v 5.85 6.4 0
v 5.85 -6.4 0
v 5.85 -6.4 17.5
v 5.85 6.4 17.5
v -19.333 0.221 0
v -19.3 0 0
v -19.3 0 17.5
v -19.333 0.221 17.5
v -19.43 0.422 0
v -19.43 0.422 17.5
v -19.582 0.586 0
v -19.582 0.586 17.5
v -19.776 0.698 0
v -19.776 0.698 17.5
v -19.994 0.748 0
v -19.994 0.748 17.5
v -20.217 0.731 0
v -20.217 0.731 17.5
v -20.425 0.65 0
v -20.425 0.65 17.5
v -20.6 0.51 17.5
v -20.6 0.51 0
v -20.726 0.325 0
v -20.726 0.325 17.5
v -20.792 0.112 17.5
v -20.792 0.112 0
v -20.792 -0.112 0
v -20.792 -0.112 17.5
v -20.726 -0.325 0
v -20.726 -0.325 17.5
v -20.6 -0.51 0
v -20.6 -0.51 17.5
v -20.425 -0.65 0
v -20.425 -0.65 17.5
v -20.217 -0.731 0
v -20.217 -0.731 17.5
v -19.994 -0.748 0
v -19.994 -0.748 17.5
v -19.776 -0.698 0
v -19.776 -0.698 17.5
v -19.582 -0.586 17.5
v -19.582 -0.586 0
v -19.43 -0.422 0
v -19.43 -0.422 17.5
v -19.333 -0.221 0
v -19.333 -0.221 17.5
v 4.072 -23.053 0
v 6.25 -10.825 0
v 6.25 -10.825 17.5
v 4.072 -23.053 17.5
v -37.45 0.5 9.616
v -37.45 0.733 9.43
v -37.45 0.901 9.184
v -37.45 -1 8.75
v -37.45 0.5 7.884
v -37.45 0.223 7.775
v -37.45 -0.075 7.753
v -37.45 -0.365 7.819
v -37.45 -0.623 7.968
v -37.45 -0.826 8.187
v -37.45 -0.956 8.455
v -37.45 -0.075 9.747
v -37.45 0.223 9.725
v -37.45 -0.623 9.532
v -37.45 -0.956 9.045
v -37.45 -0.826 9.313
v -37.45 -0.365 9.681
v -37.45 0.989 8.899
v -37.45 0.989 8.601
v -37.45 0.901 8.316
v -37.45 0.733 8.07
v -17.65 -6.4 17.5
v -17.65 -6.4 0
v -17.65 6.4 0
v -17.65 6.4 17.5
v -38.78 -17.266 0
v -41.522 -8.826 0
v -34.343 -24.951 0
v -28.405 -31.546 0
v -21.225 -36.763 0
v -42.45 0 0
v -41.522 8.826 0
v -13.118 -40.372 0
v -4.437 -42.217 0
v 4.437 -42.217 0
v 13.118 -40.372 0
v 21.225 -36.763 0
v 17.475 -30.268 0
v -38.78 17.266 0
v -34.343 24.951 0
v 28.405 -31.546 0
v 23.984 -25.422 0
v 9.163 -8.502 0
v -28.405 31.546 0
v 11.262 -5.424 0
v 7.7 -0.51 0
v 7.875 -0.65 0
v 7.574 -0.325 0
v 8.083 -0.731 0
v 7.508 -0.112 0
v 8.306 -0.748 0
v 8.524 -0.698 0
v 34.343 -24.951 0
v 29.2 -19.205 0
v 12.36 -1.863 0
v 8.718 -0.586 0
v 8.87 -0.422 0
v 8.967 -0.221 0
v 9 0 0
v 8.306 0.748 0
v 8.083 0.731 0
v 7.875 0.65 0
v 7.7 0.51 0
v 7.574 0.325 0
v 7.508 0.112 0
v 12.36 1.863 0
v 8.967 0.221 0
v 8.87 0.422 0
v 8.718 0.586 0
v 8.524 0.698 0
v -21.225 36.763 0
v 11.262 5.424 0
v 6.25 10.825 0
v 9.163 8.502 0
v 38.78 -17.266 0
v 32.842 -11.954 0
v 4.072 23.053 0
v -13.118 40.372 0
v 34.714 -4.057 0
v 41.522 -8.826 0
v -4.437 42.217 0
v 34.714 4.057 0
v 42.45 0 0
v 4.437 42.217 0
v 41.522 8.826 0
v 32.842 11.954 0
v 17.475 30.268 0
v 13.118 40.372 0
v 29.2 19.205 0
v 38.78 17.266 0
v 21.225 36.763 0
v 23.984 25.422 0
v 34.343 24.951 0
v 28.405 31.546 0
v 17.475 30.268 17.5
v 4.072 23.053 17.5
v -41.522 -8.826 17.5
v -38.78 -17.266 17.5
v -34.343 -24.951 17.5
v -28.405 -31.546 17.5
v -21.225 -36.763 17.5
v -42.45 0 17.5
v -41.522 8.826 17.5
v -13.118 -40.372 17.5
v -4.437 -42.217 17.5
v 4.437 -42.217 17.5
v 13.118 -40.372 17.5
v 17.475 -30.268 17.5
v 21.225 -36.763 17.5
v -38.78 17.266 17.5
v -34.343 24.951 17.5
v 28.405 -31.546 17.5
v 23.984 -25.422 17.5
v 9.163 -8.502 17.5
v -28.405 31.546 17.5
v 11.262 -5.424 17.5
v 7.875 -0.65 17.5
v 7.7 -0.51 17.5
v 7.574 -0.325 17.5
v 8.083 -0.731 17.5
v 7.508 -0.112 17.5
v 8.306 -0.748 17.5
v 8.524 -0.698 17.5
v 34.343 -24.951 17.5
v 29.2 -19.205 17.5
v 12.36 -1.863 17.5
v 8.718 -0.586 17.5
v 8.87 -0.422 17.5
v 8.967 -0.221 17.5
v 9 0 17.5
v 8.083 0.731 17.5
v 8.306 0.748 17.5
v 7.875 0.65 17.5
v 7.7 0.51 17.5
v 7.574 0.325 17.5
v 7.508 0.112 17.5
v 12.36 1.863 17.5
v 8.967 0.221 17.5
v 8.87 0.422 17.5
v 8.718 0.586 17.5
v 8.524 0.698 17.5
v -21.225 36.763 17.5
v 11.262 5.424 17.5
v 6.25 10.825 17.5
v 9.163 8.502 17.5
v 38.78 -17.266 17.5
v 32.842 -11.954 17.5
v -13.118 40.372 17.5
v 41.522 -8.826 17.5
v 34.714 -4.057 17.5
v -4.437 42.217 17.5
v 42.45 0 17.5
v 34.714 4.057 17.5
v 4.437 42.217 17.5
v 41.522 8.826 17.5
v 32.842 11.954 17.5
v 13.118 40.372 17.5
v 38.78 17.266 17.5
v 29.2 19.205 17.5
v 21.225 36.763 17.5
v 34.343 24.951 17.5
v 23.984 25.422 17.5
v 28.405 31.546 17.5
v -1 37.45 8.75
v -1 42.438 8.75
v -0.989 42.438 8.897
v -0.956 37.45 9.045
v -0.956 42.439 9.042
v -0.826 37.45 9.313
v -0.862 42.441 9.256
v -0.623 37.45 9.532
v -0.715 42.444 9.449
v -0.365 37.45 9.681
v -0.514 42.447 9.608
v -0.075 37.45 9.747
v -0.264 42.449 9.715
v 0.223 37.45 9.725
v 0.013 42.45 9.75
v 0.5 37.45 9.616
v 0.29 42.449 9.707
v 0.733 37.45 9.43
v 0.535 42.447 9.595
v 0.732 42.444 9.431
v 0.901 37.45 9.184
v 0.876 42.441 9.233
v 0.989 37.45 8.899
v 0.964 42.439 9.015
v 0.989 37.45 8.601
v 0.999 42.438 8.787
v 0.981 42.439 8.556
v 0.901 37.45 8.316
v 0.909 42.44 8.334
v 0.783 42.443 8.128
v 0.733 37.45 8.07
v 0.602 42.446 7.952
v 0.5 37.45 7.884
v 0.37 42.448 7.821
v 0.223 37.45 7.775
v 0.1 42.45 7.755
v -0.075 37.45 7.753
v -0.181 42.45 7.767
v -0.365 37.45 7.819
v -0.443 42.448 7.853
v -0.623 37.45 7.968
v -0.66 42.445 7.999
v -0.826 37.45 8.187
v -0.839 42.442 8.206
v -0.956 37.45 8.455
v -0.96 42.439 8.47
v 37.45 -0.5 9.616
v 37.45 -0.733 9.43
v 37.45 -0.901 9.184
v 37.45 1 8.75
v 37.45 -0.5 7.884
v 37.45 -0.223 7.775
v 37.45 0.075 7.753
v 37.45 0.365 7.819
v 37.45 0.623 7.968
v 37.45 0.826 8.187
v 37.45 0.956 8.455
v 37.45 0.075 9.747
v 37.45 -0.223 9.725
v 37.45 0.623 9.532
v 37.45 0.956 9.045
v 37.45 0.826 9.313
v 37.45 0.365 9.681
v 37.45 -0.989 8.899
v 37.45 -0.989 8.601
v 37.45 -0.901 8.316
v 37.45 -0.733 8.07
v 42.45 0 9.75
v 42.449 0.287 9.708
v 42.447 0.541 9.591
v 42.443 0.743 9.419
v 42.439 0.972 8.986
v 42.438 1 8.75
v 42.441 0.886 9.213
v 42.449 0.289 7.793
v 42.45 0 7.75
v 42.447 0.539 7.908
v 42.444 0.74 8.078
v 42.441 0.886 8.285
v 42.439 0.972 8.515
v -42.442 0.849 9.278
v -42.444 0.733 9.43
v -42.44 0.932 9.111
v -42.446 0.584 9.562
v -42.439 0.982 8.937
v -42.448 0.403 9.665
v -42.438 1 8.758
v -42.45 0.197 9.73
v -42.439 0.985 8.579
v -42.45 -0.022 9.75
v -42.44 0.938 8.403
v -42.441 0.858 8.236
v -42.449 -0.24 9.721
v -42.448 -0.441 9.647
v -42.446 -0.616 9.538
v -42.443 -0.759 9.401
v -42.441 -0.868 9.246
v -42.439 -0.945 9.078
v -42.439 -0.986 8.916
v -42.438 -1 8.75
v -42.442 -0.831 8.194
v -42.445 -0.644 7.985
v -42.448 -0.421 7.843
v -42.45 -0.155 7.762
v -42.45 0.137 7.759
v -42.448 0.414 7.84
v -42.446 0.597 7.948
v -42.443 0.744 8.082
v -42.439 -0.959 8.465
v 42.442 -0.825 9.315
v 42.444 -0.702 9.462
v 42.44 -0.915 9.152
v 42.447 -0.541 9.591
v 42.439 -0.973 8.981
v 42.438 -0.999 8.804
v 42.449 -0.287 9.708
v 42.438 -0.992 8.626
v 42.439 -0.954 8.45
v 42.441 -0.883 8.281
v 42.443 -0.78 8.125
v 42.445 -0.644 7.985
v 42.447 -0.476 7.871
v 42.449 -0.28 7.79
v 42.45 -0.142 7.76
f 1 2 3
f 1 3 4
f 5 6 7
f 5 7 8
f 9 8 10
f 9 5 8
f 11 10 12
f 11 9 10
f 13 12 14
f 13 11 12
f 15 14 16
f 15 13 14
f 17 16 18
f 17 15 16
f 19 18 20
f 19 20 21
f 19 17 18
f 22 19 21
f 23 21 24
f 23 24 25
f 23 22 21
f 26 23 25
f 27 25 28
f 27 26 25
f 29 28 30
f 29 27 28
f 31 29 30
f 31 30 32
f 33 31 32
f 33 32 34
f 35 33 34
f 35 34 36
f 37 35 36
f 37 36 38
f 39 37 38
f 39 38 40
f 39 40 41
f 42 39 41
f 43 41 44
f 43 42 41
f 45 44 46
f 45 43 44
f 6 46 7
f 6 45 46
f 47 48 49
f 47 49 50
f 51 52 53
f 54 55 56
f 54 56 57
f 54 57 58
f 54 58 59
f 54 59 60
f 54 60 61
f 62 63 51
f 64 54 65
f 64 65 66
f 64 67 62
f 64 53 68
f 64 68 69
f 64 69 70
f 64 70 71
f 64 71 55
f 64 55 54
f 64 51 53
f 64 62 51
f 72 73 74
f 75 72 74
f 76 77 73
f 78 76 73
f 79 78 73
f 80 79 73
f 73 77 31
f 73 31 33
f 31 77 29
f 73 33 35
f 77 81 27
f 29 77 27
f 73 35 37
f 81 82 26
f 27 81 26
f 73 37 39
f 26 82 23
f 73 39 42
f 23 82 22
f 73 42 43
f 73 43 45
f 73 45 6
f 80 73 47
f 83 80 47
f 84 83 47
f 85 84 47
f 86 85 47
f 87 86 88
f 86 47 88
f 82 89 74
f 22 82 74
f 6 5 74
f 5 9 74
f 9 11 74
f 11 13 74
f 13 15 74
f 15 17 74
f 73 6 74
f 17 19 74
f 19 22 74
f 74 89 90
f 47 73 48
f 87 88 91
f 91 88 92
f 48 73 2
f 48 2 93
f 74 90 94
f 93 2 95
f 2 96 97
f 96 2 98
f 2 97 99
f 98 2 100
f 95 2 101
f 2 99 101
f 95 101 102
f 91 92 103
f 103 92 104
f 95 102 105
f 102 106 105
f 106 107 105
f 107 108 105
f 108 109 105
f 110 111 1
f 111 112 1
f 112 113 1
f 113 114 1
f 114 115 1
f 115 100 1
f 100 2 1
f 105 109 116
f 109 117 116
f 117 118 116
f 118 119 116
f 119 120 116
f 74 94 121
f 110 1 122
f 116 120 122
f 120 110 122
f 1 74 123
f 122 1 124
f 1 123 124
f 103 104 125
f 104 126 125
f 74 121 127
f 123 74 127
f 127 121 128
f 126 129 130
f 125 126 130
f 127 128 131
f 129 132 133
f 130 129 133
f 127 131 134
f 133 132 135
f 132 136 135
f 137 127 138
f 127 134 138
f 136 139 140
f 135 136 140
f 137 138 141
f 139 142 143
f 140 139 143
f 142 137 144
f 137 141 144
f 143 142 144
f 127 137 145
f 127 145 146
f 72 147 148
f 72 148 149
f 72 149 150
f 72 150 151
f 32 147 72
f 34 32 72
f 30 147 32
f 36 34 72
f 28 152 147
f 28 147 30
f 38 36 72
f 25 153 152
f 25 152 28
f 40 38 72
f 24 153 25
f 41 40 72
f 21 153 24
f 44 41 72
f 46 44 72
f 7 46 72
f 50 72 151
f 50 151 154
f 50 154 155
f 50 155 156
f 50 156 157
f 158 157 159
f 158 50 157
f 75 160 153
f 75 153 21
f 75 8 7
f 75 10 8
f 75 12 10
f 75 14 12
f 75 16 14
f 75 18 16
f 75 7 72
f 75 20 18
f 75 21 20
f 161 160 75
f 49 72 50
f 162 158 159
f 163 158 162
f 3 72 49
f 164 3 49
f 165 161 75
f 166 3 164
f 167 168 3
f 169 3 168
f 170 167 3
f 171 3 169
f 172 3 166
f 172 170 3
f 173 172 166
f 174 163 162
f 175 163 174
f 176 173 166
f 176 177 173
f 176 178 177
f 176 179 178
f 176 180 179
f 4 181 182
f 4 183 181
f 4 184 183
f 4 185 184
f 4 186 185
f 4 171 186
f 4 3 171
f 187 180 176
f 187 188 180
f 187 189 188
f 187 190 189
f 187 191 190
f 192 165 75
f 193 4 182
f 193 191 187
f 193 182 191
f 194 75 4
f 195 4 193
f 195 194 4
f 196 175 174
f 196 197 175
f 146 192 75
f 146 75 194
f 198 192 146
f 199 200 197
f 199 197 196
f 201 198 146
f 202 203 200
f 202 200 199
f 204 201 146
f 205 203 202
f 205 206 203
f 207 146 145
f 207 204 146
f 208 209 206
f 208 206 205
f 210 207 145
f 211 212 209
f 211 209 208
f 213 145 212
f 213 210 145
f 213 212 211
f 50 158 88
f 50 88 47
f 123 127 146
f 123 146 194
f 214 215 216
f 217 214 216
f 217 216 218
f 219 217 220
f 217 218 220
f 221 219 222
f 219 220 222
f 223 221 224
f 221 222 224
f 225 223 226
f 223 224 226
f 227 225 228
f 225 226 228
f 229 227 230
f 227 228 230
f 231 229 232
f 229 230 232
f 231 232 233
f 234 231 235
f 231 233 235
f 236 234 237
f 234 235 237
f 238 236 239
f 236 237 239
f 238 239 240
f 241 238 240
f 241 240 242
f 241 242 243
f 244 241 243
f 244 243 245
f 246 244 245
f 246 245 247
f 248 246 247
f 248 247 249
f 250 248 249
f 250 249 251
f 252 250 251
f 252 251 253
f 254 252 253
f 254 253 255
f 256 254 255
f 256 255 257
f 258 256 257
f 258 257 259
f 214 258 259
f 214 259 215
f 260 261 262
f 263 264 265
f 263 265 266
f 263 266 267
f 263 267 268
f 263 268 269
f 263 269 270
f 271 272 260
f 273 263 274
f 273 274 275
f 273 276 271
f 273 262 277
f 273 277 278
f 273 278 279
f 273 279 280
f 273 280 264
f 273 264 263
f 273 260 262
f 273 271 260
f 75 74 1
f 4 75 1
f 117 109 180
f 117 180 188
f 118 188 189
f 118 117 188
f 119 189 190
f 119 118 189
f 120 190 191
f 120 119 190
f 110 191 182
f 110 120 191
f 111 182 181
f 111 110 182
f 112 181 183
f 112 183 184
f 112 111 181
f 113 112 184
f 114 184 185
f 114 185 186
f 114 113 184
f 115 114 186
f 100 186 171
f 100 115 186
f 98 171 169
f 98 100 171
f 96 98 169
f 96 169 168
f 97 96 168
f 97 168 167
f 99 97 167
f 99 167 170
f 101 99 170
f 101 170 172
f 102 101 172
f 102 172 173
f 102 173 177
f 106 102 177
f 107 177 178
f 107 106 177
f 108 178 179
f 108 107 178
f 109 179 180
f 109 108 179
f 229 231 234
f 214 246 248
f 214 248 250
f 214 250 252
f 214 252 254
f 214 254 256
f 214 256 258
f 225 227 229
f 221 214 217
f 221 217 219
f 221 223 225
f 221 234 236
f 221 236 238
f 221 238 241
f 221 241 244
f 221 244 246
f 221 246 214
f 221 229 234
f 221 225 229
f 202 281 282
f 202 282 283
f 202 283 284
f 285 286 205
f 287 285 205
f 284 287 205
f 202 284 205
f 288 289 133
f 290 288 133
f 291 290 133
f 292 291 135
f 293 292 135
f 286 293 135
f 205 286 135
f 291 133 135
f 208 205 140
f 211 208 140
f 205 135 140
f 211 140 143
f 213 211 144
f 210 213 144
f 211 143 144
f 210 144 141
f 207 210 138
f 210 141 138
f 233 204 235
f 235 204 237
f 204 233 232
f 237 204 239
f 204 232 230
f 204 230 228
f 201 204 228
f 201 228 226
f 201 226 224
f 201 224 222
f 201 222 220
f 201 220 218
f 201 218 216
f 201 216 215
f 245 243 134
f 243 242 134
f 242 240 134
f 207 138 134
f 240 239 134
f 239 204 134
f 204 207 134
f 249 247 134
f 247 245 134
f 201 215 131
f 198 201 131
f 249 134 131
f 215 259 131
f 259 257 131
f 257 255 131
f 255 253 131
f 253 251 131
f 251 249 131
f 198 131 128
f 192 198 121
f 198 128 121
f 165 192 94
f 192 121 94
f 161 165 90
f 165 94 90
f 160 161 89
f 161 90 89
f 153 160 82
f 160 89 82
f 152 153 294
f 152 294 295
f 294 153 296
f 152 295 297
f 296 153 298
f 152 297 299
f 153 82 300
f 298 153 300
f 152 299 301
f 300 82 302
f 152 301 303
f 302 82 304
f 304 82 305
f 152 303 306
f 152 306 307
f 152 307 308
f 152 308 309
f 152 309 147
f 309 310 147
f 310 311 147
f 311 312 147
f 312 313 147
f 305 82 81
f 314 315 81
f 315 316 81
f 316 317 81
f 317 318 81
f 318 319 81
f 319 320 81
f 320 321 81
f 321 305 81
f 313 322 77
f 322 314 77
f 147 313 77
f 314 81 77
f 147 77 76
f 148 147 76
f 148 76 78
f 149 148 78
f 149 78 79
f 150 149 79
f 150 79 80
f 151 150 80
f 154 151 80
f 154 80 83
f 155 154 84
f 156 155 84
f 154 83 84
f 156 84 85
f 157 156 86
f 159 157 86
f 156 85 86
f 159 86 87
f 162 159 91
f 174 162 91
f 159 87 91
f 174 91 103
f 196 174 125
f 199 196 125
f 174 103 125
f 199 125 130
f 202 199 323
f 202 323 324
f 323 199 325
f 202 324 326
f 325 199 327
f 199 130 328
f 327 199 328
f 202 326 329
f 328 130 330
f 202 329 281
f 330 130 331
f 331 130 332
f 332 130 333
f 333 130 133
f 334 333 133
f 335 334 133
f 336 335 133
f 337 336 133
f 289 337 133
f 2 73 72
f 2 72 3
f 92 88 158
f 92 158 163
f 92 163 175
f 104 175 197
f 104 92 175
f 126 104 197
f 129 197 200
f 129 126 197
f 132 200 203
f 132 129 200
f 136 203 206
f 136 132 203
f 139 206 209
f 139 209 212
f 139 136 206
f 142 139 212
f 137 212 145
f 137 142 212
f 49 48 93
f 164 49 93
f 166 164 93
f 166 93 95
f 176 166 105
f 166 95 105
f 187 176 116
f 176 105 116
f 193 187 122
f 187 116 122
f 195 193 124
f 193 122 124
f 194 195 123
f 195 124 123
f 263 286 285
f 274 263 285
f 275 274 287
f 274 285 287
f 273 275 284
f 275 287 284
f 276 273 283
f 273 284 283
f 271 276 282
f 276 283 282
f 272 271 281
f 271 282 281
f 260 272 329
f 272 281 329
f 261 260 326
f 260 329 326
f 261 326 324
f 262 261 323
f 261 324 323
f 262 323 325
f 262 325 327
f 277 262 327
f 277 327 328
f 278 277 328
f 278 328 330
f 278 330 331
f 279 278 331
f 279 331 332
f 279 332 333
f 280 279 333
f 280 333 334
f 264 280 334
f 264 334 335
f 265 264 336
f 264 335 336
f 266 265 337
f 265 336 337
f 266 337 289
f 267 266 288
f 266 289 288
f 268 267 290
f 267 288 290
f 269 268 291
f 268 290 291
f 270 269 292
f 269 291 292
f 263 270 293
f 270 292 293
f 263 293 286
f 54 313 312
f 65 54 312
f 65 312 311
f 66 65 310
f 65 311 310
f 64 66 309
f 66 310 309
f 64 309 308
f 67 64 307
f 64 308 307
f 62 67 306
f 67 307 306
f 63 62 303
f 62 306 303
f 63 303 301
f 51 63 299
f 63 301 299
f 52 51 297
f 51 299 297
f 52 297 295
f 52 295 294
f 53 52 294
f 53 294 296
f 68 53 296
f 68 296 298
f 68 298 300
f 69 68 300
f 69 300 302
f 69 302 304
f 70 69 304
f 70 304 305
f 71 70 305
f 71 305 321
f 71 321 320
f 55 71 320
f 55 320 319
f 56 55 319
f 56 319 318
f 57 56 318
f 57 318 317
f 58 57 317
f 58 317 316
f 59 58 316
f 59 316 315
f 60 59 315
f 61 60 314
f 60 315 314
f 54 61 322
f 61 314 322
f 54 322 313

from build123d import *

# Parameters (mm, degrees)
SKETCH021_R           = 42.45
SKETCH021_R_2         = 0.75
SKETCH021_W           = 23.5
SKETCH021_H           = 12.8
PAD010_DEPTH          = 17.5
SKETCH025_R           = 1
POCKET013_DEPTH       = 5
POLARPATTERN002_COUNT = 3
POLARPATTERN002_ANGLE = 180


with BuildPart() as part:
    # Sketch021 → Pad010 (new body)
    with BuildSketch(Plane.XY):
        Circle(SKETCH021_R)
        with Locations((8.25, 0)):
            Circle(SKETCH021_R_2, mode=Mode.SUBTRACT)
        with Locations((-20.05, 0)):
            Circle(SKETCH021_R_2, mode=Mode.SUBTRACT)
        with BuildLine():
            ThreePointArc((6.249999, -10.825318), (12.5, -2e-06), (6.250002, 10.825316))
            Line((4.071802, 23.052558), (6.250002, 10.825316))
            Line((17.475007, 30.267584), (4.071802, 23.052558))
            ThreePointArc((17.474996, -30.26759), (34.95, -6e-06), (17.475007, 30.267584))
            Line((17.474996, -30.26759), (4.071794, -23.052559))
            Line((6.249999, -10.825318), (4.071794, -23.052559))
        make_face(mode=Mode.SUBTRACT)
        with Locations((-5.9, 0)):
            Rectangle(SKETCH021_W, SKETCH021_H, mode=Mode.SUBTRACT)
    extrude(amount=PAD010_DEPTH)

    # Sketch025 (on DatumPlane) → Pocket013 (cut)
    with BuildSketch(Plane.YZ.offset(42.45)):
        with Locations((0, 8.75)):
            Circle(SKETCH025_R)
    pocket013 = extrude(amount=-POCKET013_DEPTH, mode=Mode.SUBTRACT)

    # PolarPattern002: Pocket013 ×3 about axis
    polarpattern002_axis = Axis((0, 0, 0), (0, 0, 1))
    for i in range(1, POLARPATTERN002_COUNT):
        add(pocket013.rotate(polarpattern002_axis, i * POLARPATTERN002_ANGLE / (POLARPATTERN002_COUNT - 1)), mode=Mode.SUBTRACT)


solid = part.part
